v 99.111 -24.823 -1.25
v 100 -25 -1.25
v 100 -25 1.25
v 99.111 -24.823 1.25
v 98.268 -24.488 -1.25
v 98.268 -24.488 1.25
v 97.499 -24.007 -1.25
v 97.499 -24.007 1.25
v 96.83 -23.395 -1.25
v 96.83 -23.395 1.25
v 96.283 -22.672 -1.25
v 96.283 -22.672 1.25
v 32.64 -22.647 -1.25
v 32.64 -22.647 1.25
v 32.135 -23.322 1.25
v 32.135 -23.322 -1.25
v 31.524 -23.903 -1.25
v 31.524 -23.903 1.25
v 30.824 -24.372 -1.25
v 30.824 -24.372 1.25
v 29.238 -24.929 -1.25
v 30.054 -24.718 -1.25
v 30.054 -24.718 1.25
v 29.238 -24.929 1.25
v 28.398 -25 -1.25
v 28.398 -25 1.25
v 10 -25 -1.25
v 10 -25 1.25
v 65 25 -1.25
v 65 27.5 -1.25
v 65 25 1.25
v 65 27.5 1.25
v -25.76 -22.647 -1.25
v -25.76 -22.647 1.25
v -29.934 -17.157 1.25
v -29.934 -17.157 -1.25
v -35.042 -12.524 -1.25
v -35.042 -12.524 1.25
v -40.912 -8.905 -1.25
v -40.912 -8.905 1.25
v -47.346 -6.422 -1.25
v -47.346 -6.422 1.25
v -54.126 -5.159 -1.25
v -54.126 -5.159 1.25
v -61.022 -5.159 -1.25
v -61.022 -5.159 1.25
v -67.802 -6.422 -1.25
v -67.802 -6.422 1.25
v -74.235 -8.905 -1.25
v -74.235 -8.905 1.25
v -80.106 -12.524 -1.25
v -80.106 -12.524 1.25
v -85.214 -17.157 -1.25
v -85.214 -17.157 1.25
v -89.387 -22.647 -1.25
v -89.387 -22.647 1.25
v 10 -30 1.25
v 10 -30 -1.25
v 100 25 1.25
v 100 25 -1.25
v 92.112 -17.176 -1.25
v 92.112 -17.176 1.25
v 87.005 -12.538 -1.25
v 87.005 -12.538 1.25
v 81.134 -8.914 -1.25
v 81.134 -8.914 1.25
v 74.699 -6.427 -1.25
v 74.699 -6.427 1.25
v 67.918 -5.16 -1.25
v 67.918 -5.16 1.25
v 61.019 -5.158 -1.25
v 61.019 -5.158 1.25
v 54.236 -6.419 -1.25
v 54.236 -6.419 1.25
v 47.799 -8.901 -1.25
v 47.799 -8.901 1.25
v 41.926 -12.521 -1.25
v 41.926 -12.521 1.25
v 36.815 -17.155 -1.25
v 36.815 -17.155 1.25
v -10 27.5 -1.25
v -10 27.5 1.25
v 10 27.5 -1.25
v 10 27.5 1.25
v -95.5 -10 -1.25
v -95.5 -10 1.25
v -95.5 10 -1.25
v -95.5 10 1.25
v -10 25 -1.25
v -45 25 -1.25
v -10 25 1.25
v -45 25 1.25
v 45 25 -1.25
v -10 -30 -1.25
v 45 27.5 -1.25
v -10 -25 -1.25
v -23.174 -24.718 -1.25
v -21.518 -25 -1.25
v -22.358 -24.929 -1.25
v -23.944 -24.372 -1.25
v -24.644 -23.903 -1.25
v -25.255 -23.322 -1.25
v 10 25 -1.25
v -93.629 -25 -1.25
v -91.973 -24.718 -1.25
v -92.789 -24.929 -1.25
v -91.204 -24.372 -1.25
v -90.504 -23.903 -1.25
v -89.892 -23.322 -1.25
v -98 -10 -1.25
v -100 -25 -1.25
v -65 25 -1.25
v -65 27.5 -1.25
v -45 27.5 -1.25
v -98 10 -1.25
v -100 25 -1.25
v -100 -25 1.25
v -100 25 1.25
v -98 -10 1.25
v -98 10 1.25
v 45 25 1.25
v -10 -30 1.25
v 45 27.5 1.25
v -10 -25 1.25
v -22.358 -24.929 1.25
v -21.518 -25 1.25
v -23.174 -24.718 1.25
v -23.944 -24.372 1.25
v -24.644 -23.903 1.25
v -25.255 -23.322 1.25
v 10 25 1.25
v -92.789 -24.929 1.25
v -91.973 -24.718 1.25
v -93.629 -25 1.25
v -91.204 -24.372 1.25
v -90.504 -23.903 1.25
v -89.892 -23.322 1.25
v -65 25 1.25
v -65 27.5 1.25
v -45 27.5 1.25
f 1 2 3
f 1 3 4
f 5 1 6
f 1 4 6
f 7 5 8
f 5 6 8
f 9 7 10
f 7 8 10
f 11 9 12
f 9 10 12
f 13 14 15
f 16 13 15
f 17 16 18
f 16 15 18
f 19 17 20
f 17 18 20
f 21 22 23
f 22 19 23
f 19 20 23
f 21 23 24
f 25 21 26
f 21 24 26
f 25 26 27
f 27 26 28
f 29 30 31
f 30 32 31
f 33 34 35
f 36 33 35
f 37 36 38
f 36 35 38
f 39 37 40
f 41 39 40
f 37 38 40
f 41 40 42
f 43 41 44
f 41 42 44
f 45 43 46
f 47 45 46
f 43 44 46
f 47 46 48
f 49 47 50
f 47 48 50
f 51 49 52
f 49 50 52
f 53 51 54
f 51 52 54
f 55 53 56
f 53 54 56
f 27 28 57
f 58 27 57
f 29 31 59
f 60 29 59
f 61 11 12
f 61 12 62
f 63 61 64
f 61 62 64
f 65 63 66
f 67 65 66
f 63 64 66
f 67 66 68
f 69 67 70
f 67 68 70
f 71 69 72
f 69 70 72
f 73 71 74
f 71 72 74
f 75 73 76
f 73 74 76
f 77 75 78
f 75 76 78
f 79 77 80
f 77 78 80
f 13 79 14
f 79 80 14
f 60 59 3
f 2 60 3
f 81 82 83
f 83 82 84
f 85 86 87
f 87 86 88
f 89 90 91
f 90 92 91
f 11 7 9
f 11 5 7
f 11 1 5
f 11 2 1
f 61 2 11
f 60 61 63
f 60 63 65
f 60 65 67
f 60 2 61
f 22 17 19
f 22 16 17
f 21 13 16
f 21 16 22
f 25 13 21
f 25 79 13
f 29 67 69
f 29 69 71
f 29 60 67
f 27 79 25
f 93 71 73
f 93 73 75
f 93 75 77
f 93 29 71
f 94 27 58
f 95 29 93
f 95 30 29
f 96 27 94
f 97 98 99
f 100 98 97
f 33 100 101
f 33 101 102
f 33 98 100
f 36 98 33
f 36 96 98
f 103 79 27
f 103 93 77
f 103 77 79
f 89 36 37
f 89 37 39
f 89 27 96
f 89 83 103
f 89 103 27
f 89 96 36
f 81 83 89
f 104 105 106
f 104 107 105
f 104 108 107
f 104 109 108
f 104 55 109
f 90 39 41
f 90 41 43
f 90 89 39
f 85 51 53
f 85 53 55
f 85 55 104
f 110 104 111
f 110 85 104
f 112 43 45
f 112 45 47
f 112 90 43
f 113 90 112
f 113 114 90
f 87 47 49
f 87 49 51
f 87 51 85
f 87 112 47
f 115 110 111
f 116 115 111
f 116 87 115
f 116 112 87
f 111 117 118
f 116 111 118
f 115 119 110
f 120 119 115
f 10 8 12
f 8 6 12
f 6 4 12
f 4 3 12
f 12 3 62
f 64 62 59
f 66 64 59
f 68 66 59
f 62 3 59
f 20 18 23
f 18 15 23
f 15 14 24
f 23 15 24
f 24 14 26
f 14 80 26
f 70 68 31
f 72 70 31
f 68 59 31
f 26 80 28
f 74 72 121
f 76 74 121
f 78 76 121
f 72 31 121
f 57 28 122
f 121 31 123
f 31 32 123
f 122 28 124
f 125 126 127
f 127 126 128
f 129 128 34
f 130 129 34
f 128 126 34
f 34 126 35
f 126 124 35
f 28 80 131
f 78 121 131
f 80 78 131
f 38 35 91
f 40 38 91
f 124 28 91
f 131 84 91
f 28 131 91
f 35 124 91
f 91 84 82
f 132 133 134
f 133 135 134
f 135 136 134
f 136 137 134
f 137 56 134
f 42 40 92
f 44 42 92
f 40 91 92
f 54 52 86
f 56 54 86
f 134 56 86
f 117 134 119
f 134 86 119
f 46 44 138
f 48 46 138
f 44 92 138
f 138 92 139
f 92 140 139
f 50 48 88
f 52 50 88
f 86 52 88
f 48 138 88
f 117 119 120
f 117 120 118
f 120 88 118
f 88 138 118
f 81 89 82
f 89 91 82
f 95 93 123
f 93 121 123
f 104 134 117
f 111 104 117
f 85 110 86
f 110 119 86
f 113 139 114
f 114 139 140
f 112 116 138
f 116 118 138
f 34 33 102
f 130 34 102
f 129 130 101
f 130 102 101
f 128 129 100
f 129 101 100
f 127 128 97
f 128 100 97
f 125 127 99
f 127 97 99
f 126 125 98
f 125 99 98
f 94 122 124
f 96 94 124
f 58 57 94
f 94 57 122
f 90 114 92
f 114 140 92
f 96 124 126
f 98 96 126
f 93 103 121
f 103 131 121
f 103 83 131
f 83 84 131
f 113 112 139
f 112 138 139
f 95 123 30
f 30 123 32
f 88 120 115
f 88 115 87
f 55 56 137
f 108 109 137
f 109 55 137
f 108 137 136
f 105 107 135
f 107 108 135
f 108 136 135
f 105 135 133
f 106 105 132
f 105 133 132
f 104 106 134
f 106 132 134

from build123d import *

# Parameters (mm, degrees)
SKETCH1_W           = 2.5
SKETCH1_H           = 20
BOSS_EXTRUDE1_DEPTH = 1.25
FILLET2_R           = 5


with BuildPart() as part:
    # Sketch1 → Boss-Extrude1 (new, symmetric)
    with BuildSketch(Plane.XY):
        with BuildLine():
            Line((-100, -25), (-100, 25))
            Line((-100, 25), (-65, 25))
            Line((-65, 25), (-65, 27.5))
            Line((-65, 27.5), (-45, 27.5))
            Line((-45, 27.5), (-45, 25))
            Line((-45, 25), (-10, 25))
            Line((-10, 25), (-10, 27.5))
            Line((-10, 27.5), (10, 27.5))
            Line((10, 27.5), (10, 25))
            Line((10, 25), (45, 25))
            Line((45, 25), (45, 27.5))
            Line((45, 27.5), (65, 27.5))
            Line((65, 27.5), (65, 25))
            Line((65, 25), (100, 25))
            Line((100, 25), (100, -25))
            Line((100, -25), (97.62, -25))
            ThreePointArc((97.62, -25), (64.453752096, -5), (31.287504193, -25))
            Line((31.287504193, -25), (10, -25))
            Line((10, -25), (10, -30))
            Line((10, -30), (-10, -30))
            Line((-10, -30), (-10, -25))
            Line((-10, -25), (-24.407504193, -25))
            ThreePointArc((-24.407504193, -25), (-57.573752096, -5), (-90.74, -25))
            Line((-90.74, -25), (-100, -25))
        make_face()
        with Locations((-96.75, 0)):
            Rectangle(SKETCH1_W, SKETCH1_H, mode=Mode.SUBTRACT)
    extrude(amount=BOSS_EXTRUDE1_DEPTH, both=True)

    # Fillet2
    # the kernel refuses this fillet: 5 mm, written as the material it takes off along each edge
    with BuildSketch(Plane(origin=(97.62, -25, 7.962737252), x_dir=(-0.49803133074323064, 0.8671590359317758, 0), z_dir=(0, 0, -1))) as fillet2_piece_1:
        with BuildLine():
            CenterArc((2.864101227, 4.996794646), FILLET2_R, 215.915482701, 52.032817446)
            Line((-1.185314567, 2.063838506), (-1.266302883, 2.005179383))
            ThreePointArc((-1.266302883, 2.005179383), (-0.679373187, 0.98211612), (-0.086715904, -0.049803133))
            Line((-0.086715904, -0.049803133), (0.003580127, -0.099935893))
            ThreePointArc((0.003580127, -0.099935893), (1.34254745, -0.075959846), (2.681514774, -0.099935893))
            Line((2.681514774, -0.099935893), (2.685094901, 0))
        make_face()
    extrude(amount=15.925474504, mode=Mode.SUBTRACT)
    with BuildSketch(Plane(origin=(31.287504193, -25, 8.473162128), x_dir=(-1, 0, 0), z_dir=(0, 0, -1))) as fillet2_piece_2:
        with BuildLine():
            CenterArc((2.889264851, 5), FILLET2_R, 211.965718751, 58.034281249)
            Line((-1.352560179, 2.352941176), (-1.437396679, 2.3))
            ThreePointArc((-1.437396679, 2.3), (-0.741683603, 1.138874159), (-0.088443328, -0.046666667))
            Line((-0.088443328, -0.046666667), (0, -0.1))
            Line((0, -0.1), (2.889264851, -0.1))
            Line((2.889264851, -0.1), (2.889264851, 0))
        make_face()
    extrude(amount=16.946324255, mode=Mode.SUBTRACT)
    with BuildSketch(Plane(origin=(-24.407504193, -25, -8.473162128), x_dir=(-0.4983656192119462, 0.8669669599168663, 0), z_dir=(0, 0, 1)), Plane(origin=(-90.74, -25, 8.473162128), x_dir=(0.4983656192119447, 0.8669669599168673, 0), z_dir=(0, 0, -1))) as fillet2_piece_3:
        with BuildLine():
            CenterArc((2.894924533, -4.99672526), FILLET2_R, 92.073789733, 58.034281249)
            Line((-1.439910267, -2.504897164), (-1.526606963, -2.455060602))
            Line((-1.526606963, -2.455060602), (-0.086696696, 0.049836562))
            Line((-0.086696696, 0.049836562), (0.003618656, 0.099934505))
            ThreePointArc((0.003618656, 0.099934505), (1.356995875, 0.075439453), (2.710373094, 0.099934505))
            Line((2.710373094, 0.099934505), (2.71399175, 0))
        make_face()
    extrude(amount=16.946324255, mode=Mode.SUBTRACT)


solid = part.part
